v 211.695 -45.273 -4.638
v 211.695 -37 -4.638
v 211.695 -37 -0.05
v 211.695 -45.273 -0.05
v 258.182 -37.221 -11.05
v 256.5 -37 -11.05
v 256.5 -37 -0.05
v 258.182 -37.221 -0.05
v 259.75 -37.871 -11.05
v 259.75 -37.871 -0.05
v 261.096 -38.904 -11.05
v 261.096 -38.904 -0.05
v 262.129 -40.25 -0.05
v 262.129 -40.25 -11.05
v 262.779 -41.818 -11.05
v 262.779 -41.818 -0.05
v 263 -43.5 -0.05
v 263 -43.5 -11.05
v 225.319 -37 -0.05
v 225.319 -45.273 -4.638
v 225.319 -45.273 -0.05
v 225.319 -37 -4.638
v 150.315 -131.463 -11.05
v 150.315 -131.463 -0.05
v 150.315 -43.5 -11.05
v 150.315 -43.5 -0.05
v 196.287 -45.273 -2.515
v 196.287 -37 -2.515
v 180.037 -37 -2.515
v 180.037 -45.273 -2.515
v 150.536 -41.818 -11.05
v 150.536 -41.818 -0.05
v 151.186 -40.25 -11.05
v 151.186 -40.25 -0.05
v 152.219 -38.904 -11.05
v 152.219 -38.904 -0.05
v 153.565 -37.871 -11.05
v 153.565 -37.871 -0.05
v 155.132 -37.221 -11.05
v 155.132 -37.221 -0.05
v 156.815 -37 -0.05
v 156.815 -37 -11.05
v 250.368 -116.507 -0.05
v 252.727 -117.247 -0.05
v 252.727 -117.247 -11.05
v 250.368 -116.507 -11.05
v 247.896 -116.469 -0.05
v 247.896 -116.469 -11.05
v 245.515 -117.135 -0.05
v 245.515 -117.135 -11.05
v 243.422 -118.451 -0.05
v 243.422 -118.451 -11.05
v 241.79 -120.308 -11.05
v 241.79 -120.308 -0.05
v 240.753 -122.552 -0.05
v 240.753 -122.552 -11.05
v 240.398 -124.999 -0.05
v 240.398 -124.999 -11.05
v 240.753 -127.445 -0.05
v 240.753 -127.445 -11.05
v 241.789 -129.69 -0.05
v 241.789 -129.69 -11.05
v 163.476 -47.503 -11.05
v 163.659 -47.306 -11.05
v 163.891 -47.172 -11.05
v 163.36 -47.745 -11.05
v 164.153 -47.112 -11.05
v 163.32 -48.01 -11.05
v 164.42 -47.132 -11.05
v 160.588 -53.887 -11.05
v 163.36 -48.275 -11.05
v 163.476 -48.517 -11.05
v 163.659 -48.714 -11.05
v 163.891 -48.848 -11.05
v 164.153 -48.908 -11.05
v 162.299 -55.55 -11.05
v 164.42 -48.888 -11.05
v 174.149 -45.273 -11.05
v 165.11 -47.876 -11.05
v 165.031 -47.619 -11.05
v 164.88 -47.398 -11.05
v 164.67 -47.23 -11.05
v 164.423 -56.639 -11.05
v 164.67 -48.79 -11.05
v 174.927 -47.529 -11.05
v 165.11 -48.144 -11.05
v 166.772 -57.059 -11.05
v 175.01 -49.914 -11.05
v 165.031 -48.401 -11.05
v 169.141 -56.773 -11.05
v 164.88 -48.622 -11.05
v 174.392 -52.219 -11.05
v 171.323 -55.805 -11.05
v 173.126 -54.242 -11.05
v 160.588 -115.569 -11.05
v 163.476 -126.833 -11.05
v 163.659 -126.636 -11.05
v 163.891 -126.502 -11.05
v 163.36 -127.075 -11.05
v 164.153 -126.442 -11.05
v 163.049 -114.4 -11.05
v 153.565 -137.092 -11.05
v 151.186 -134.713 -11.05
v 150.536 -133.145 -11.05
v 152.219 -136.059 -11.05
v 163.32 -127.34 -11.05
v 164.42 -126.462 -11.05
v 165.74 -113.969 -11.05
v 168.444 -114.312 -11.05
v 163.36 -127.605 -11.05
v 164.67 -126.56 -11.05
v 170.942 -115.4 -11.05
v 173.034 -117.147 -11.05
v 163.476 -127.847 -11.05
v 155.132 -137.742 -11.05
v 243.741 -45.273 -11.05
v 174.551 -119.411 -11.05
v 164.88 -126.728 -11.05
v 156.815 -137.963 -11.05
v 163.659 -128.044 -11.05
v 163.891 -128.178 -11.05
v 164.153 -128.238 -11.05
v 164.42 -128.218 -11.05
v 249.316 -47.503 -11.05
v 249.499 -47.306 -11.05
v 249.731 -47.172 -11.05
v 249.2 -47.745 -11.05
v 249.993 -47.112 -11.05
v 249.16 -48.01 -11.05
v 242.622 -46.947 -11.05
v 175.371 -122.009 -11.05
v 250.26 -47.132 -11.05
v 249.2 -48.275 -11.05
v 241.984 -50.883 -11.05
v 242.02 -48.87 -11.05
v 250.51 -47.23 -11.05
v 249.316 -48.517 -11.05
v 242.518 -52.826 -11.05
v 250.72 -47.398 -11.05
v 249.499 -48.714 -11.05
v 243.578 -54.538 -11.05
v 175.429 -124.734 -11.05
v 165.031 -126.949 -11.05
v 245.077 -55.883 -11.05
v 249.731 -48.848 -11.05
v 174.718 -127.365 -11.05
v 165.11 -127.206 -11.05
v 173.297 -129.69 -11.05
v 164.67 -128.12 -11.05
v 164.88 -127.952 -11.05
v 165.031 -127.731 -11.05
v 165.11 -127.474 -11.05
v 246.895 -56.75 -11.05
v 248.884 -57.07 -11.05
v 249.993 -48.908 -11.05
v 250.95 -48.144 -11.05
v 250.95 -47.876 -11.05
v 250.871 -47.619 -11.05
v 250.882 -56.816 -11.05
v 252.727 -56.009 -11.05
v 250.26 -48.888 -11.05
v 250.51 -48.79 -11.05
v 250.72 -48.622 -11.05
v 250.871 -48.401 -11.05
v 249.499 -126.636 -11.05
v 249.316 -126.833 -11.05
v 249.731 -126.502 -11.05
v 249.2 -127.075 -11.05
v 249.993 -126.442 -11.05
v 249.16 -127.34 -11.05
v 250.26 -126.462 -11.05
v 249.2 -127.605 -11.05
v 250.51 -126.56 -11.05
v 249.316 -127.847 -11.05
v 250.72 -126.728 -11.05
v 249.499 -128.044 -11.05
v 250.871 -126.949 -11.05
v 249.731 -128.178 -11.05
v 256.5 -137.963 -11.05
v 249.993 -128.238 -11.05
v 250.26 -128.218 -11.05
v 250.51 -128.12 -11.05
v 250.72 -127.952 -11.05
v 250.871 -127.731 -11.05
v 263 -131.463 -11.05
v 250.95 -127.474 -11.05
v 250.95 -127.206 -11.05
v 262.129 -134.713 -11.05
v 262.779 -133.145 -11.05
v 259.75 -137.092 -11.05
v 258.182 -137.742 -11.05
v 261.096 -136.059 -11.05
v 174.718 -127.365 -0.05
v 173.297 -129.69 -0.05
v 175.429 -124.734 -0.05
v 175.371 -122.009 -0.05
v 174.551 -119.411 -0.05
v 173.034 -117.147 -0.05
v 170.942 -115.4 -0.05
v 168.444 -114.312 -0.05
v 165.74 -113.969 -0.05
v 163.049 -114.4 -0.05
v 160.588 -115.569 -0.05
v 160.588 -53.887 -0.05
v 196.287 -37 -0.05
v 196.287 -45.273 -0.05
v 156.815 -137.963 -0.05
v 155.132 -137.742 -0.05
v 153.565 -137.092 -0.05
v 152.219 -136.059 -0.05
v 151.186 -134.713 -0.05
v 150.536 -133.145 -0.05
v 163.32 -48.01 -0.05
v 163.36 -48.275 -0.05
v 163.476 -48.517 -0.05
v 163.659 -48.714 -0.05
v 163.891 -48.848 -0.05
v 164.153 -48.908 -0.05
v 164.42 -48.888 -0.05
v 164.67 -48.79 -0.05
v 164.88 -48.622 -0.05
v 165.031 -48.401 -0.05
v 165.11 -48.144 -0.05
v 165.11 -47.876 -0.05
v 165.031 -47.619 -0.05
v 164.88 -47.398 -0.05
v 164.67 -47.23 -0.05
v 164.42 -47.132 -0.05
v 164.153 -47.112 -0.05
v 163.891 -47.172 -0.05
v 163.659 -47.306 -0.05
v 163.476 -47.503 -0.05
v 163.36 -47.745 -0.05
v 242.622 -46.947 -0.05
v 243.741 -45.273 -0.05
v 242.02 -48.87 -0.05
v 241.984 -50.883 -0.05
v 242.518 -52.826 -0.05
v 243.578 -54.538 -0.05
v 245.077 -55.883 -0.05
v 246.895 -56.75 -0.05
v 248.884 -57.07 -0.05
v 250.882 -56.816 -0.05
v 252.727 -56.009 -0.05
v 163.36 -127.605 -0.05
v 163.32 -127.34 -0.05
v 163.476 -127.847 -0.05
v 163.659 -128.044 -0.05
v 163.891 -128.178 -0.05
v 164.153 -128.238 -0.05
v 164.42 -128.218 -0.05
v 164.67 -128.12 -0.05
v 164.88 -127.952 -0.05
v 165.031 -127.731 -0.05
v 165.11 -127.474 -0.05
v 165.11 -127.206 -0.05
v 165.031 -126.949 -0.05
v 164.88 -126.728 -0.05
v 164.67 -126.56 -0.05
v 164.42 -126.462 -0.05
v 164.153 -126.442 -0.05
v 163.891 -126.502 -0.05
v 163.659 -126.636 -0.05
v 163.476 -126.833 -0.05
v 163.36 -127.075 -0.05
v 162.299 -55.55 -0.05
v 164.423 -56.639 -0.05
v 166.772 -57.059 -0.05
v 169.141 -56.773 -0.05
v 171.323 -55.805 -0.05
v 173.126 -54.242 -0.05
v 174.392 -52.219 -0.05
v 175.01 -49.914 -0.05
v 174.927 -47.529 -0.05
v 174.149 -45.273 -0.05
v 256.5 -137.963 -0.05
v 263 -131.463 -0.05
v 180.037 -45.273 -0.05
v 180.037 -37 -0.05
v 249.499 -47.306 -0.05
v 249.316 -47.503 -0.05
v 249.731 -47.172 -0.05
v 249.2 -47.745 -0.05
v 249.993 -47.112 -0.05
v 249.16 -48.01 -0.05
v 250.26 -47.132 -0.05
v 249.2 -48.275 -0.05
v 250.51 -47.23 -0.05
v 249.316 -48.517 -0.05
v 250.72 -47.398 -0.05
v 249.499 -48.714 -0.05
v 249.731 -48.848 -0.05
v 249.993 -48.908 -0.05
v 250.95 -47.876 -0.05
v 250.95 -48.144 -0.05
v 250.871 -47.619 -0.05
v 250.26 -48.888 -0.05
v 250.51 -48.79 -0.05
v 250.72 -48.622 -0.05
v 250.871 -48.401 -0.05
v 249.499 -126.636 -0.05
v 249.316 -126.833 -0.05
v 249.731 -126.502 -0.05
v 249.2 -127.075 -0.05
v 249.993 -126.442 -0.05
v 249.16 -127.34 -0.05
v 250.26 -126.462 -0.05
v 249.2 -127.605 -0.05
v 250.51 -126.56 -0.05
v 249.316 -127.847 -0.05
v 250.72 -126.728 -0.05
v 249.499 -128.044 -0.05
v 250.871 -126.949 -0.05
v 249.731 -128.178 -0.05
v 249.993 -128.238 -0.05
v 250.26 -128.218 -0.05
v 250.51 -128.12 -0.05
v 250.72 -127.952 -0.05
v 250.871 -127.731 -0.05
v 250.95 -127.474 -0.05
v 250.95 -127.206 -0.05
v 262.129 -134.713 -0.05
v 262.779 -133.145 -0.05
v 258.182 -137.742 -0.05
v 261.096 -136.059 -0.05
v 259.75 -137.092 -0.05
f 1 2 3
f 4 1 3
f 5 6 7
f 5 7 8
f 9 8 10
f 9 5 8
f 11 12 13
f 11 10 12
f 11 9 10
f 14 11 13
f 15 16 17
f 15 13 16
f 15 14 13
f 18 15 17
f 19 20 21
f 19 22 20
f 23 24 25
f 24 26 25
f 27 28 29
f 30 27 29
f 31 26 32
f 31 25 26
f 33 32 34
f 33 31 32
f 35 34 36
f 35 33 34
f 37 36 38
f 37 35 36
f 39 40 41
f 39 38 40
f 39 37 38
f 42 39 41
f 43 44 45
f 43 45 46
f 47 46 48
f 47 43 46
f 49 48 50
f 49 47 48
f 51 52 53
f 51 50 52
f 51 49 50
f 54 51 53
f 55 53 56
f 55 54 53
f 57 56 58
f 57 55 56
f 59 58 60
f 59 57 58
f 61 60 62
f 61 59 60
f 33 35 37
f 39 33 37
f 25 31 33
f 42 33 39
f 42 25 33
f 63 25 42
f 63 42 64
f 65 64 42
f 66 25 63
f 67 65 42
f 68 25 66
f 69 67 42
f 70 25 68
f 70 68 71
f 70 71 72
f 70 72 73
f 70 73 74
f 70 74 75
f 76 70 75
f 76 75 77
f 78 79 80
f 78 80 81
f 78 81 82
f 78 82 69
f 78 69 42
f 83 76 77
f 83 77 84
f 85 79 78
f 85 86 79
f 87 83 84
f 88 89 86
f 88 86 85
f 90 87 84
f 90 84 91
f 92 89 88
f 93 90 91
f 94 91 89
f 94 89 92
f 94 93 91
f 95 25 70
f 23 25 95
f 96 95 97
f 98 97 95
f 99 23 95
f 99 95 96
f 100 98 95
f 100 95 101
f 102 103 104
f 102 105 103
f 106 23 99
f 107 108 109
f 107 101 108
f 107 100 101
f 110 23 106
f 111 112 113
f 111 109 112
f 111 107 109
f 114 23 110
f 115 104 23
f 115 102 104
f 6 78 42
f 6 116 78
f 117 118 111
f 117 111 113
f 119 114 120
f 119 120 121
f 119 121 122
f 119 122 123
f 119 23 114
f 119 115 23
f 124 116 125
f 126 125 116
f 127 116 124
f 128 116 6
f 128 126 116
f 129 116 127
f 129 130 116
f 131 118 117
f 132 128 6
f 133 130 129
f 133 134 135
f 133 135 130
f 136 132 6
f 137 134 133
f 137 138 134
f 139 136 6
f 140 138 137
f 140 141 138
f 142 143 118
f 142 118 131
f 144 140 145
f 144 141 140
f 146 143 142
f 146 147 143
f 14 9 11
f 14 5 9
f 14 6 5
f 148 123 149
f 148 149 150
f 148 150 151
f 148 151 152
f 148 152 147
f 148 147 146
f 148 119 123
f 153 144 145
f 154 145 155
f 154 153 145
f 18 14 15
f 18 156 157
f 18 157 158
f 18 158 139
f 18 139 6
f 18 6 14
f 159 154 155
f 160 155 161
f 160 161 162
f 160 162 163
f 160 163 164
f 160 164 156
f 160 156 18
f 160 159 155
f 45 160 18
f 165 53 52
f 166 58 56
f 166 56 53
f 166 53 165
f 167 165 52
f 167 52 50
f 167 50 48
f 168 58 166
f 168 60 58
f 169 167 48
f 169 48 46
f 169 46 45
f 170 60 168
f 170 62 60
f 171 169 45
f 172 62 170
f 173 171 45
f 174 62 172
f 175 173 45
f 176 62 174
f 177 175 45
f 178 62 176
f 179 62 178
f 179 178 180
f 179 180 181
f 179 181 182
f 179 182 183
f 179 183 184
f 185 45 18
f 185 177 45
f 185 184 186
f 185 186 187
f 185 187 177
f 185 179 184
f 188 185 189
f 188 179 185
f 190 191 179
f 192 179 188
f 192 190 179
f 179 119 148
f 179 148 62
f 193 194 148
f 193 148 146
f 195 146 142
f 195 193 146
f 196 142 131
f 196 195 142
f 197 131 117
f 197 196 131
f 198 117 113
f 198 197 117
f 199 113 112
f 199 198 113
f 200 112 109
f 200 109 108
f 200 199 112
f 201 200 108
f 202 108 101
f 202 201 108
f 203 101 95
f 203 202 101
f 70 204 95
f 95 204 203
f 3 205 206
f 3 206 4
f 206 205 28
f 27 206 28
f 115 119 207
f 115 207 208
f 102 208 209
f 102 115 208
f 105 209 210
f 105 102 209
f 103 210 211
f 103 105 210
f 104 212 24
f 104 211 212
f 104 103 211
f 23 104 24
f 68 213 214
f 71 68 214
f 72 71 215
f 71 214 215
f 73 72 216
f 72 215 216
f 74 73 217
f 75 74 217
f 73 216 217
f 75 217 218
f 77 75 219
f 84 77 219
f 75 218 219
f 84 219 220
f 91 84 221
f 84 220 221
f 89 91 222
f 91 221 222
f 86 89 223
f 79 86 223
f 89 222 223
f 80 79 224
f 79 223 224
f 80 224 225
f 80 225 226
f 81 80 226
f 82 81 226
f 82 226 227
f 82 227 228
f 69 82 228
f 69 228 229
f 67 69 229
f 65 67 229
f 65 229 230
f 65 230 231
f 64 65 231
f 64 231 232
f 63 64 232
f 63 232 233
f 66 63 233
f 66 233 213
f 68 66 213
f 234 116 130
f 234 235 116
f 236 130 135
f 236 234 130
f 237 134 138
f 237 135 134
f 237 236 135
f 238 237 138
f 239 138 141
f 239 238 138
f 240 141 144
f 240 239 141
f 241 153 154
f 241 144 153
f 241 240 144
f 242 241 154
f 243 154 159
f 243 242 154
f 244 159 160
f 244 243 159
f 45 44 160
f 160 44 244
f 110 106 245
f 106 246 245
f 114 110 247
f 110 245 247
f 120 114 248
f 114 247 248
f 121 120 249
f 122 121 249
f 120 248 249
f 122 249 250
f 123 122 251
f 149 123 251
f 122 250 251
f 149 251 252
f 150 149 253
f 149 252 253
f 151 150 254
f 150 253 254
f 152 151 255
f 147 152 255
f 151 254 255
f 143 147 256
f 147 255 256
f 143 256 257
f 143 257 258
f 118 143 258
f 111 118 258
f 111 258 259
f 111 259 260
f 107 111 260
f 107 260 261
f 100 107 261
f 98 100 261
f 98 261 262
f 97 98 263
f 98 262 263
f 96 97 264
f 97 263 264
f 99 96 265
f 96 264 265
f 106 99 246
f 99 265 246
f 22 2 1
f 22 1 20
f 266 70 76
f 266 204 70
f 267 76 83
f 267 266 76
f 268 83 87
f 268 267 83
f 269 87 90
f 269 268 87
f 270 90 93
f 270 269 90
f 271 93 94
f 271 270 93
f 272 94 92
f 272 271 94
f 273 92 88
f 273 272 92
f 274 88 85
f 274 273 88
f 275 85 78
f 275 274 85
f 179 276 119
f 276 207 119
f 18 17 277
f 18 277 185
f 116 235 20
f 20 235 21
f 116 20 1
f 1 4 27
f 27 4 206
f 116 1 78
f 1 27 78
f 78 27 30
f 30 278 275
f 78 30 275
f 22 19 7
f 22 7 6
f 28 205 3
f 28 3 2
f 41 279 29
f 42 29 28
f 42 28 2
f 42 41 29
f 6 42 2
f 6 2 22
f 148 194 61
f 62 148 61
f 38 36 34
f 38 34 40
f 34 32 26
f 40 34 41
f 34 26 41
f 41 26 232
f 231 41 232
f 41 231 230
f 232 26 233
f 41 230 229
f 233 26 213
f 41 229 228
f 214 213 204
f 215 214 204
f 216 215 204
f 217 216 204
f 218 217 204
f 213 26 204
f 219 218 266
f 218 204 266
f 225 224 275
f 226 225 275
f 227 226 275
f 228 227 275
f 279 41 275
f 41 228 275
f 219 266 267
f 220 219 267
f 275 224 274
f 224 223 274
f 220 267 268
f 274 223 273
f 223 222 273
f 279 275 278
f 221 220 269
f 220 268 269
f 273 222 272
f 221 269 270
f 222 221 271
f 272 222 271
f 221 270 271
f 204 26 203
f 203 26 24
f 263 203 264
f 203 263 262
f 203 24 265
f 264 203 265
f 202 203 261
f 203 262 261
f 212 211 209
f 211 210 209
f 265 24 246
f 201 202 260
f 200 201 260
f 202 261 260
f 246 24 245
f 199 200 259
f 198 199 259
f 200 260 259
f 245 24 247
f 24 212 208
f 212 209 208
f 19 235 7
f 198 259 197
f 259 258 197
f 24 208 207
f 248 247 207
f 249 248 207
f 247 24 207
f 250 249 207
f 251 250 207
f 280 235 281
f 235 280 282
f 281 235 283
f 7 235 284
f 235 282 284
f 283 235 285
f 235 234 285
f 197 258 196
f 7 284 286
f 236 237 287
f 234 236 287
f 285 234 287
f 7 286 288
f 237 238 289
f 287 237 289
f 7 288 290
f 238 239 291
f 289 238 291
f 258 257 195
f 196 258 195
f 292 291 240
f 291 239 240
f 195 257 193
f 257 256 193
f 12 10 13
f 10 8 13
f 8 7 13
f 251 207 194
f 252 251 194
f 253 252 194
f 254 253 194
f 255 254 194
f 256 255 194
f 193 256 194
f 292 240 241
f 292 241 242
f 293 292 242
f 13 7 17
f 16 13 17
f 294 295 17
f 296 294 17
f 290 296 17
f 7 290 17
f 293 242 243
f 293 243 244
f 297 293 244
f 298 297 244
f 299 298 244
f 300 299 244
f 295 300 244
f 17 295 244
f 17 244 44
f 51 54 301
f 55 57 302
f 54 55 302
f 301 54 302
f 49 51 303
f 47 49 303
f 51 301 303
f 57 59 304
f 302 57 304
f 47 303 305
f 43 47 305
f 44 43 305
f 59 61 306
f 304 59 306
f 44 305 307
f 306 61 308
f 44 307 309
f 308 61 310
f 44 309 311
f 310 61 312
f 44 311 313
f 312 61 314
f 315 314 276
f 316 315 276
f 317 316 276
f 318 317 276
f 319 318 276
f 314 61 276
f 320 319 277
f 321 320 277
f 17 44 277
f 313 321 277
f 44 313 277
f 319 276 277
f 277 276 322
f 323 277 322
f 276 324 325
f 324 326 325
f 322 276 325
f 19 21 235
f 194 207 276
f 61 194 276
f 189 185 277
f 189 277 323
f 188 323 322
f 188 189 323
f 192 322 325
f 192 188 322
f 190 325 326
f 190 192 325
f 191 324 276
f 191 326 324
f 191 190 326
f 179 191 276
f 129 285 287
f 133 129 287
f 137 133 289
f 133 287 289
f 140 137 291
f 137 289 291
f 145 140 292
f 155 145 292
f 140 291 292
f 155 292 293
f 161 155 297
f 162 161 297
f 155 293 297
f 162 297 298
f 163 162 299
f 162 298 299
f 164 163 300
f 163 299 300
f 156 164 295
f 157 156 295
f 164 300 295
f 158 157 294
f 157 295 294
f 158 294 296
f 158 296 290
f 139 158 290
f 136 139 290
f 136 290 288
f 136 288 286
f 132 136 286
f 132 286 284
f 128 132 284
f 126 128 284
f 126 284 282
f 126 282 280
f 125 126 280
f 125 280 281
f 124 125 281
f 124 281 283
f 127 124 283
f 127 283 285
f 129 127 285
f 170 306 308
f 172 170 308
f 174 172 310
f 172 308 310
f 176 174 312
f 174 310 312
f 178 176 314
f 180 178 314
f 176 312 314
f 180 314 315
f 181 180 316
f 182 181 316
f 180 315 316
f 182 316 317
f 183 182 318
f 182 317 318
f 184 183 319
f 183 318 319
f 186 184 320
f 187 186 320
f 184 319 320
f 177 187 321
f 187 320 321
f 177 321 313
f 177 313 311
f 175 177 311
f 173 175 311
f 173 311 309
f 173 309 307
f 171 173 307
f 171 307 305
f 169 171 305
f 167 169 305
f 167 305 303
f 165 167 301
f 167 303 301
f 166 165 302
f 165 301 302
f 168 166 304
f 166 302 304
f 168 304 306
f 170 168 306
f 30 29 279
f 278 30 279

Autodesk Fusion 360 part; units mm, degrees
sketch "Sketch2" plane through (0, 0, -0.05) normal (0, 0, -1) x (1, 0, 0)
  line L0 (260, 40) -> (153.3147, 40)
  line L1 (153.3147, 40) -> (153.3147, 134.963)
  line L2 (153.3147, 134.963) -> (260, 134.963)
  line L3 (260, 134.963) -> (260, 40)
  line L4 (254.727, 129.69) -> (254.727, 45.273)
  line L5 (254.727, 45.273) -> (158.5878, 45.273)
  line L6 (158.5878, 45.273) -> (158.5878, 129.69)
  line L7 (158.5878, 129.69) -> (254.727, 129.69)
  dimension "d1" = 5.273
extrude "Extrude1" add sketch "Sketch2" along normal blind 11
extrude "Extrude2" add 1 faces at (153.3147, -71.6543, -3.7167) along direction (-1, 0, 0) blind 3
extrude "Extrude3" add 1 faces at (223.4382, -40, -3.7167) along direction (0, 1, 0) blind 3
extrude "Extrude4" add 1 faces at (260, -102.3087, -3.7167) along direction (1, 0, 0) blind 3
extrude "Extrude5" add 1 faces at (225.4382, -134.963, -7.3833) along direction (0, -1, 0) blind 3
sketch "Sketch3" plane through (0, -37, 0) normal (0, 1, 0) x (-1, 0, 0)
  line L0 (-150.3147, -0.05) -> (-263, -0.05)
  line L1 (-263, -0.05) -> (-263, -11.05)
  line L2 (-263, -11.05) -> (-150.3147, -11.05)
  line L3 (-150.3147, -11.05) -> (-150.3147, -0.05)
  line L4 (-180.0368, -0.05) -> (-196.2868, -0.05)
  line L5 (-196.2868, -0.05) -> (-196.2868, -2.5147)
  line L6 (-196.2868, -2.5147) -> (-180.0368, -2.5147)
  line L7 (-180.0368, -2.5147) -> (-180.0368, -0.05)
extrude "Extrude6" cut sketch "Sketch3" against normal blind 23 contours L0 L4 L5 L6 L7
sketch "Sketch4" plane through (0, -37, 0) normal (0, 1, 0) x (-1, 0, 0)
  line L0 (-196.2868, -2.5147) -> (-196.2868, -0.05)
  line L1 (-196.2868, -0.05) -> (-263, -0.05)
  line L2 (-263, -0.05) -> (-263, -11.05)
  line L3 (-263, -11.05) -> (-150.3147, -11.05)
  line L4 (-150.3147, -11.05) -> (-150.3147, -0.05)
  line L5 (-150.3147, -0.05) -> (-180.0368, -0.05)
  line L6 (-180.0368, -0.05) -> (-180.0368, -2.5147)
  line L7 (-180.0368, -2.5147) -> (-196.2868, -2.5147)
  line L8 (-223.6278, -0.05) -> (-213.3861, -0.05)
  line L9 (-213.3861, -0.05) -> (-213.3861, -4.6383)
  line L10 (-213.3861, -4.6383) -> (-223.6278, -4.6383)
  line L11 (-223.6278, -4.6383) -> (-223.6278, -0.05)
extrude "Extrude7" cut sketch "Sketch4" against normal blind 15.5 contours L1 L8 L9 L10 L11
extrude "Extrude8" add 1 faces at (158.5878, -73.412, -3.7167) along direction (1, 0, 0) blind 2
extrude "Extrude9" add 1 faces at (254.727, -101.551, -3.7167) along direction (-1, 0, 0) blind 2
sketch "Sketch5" plane through (0, 0, -0.05) normal (0, 0, -1) x (1, 0, 0)
  circle A0 centre (167, 49) radius 8.0623
extrude "Extrude10" add sketch "Sketch5" along normal blind 11
sketch "Sketch6" plane through (0, 0, -0.05) normal (0, 0, -1) x (1, 0, 0)
  circle A0 centre (166, 126) radius 7.8102
  circle A1 centre (247, 125) radius 9.2195
  circle A2 centre (249, 50) radius 7.0711
extrude "Extrude11" add sketch "Sketch6" along normal blind 11 contours A2
sketch "Sketch7" plane through (0, 0, -0.05) normal (0, 0, -1) x (1, 0, 0)
  circle A0 centre (249, 125) radius 8.6023
extrude "Extrude12" add sketch "Sketch7" along normal blind 11
sketch "Sketch8" plane through (0, 0, -0.05) normal (0, 0, -1) x (1, 0, 0)
  circle A0 centre (165.8963, 123.5709) radius 9.6029
extrude "Extrude13" add sketch "Sketch8" along normal blind 11
fillet "Fillet1" radius 6.5 1 edges at (263, -137.963, -5.55)
fillet "Fillet2" radius 6.5 1 edges at (263, -37, -5.55)
fillet "Fillet3" radius 6.5 1 edges at (150.3147, -37, -5.55)
fillet "Fillet4" radius 6.5 1 edges at (150.3147, -137.963, -5.55)
sketch "Sketch9" plane through (0, 0, 0) normal (0, 0, 1) x (-1, 0, 0)
  circle A0 centre (-164.22, 127.34) radius 2.2
  circle A1 centre (-165.3867, 128.5067) radius 0.175
  circle A2 centre (-164.22, 128.99) radius 0.175
  circle A3 centre (-165.87, 127.34) radius 0.175
  circle A4 centre (-164.22, 127.34) radius 1.075
  circle A5 centre (-163.0533, 128.5067) radius 0.175
  circle A6 centre (-162.57, 127.34) radius 0.175
  circle A7 centre (-165.3867, 126.1733) radius 0.175
  circle A8 centre (-164.22, 125.69) radius 0.175
  circle A9 centre (-163.0533, 126.1733) radius 0.175
sketch "Sketch10" plane through (0, 0, 1.56) normal (0, 0, 1) x (-1, 0, 0)
  arc A0 (-164.0236, 44.0124) -> (-160.2224, 47.8136) centre (-164.22, 48.01) ccw
  line L0 (-160.2224, 47.8136) -> (-160.22, 48.01)
  line L1 (-160.22, 48.01) -> (-160.22, 127.34)
  line L2 (-160.22, 127.34) -> (-160.2224, 127.5364)
  arc A1 (-160.2224, 127.5364) -> (-164.0236, 131.3376) centre (-164.22, 127.34) ccw
  line L3 (-164.0236, 131.3376) -> (-164.22, 131.34)
  line L4 (-164.22, 131.34) -> (-250.06, 131.34)
  line L5 (-250.06, 131.34) -> (-250.2564, 131.3376)
  arc A2 (-250.2564, 131.3376) -> (-254.0576, 127.5364) centre (-250.06, 127.34) ccw
  line L6 (-254.0576, 127.5364) -> (-254.06, 127.34)
  line L7 (-254.06, 127.34) -> (-254.06, 48.01)
  line L8 (-254.06, 48.01) -> (-254.0576, 47.8136)
  arc A3 (-254.0576, 47.8136) -> (-250.2564, 44.0124) centre (-250.06, 48.01) ccw
  line L9 (-250.2564, 44.0124) -> (-250.06, 44.01)
  line L10 (-250.06, 44.01) -> (-164.22, 44.01)
  line L11 (-164.22, 44.01) -> (-164.0236, 44.0124)
  circle A4 centre (-164.22, 127.34) radius 2.2
  circle A5 centre (-250.06, 127.34) radius 2.2
  circle A6 centre (-188.38, 126.32) radius 1.1
  circle A7 centre (-198.58, 126.32) radius 1.1
  arc A8 (-214.77, 126.55) -> (-214.77, 124.65) centre (-214.77, 125.6) ccw
  line L12 (-214.77, 126.55) -> (-213.47, 126.55)
  arc A9 (-213.47, 124.65) -> (-213.47, 126.55) centre (-213.47, 125.6) ccw
  line L13 (-213.47, 124.65) -> (-214.77, 124.65)
  arc A10 (-227.27, 126.55) -> (-227.27, 124.65) centre (-227.27, 125.6) ccw
  line L14 (-227.27, 126.55) -> (-225.97, 126.55)
  arc A11 (-225.97, 124.65) -> (-225.97, 126.55) centre (-225.97, 125.6) ccw
  line L15 (-225.97, 124.65) -> (-227.27, 124.65)
  circle A12 centre (-188.38, 123.57) radius 0.9
  circle A13 centre (-198.58, 123.57) radius 0.9
  arc A14 (-214.77, 121.55) -> (-214.77, 119.65) centre (-214.77, 120.6) ccw
  line L16 (-214.77, 121.55) -> (-213.47, 121.55)
  arc A15 (-213.47, 119.65) -> (-213.47, 121.55) centre (-213.47, 120.6) ccw
  line L17 (-213.47, 119.65) -> (-214.77, 119.65)
  arc A16 (-227.27, 121.55) -> (-227.27, 119.65) centre (-227.27, 120.6) ccw
  line L18 (-227.27, 121.55) -> (-225.97, 121.55)
  arc A17 (-225.97, 119.65) -> (-225.97, 121.55) centre (-225.97, 120.6) ccw
  line L19 (-225.97, 119.65) -> (-227.27, 119.65)
  circle A18 centre (-188.38, 119.92) radius 1.1
  circle A19 centre (-198.58, 119.92) radius 1.1
  circle A20 centre (-248.26, 102) radius 0.85
  circle A21 centre (-248.26, 99.46) radius 0.85
  circle A22 centre (-248.26, 96.92) radius 0.85
  circle A23 centre (-248.26, 94.38) radius 0.85
  circle A24 centre (-248.26, 91.84) radius 0.85
  circle A25 centre (-248.26, 89.3) radius 0.85
  circle A26 centre (-248.26, 86.76) radius 0.85
  circle A27 centre (-248.26, 84.22) radius 0.85
  circle A28 centre (-248.26, 81.68) radius 0.85
  circle A29 centre (-248.26, 79.14) radius 0.85
  circle A30 centre (-248.26, 76.6) radius 0.85
  circle A31 centre (-248.26, 74.06) radius 0.85
  circle A32 centre (-248.26, 71.52) radius 0.85
  line L20 (-249.11, 68.13) -> (-249.11, 69.83)
  line L21 (-249.11, 69.83) -> (-247.41, 69.83)
  line L22 (-247.41, 69.83) -> (-247.41, 68.13)
  line L23 (-247.41, 68.13) -> (-249.11, 68.13)
  circle A33 centre (-202.95, 54.5201) radius 0.6604
  circle A34 centre (-205.49, 54.5201) radius 0.6604
  circle A35 centre (-208.03, 54.5201) radius 0.6604
  arc A36 (-215.57, 49.8) -> (-216.67, 49.8) centre (-216.12, 49.8) ccw
  line L24 (-215.57, 49.8) -> (-215.57, 49.4)
  arc A37 (-216.67, 49.4) -> (-215.57, 49.4) centre (-216.12, 49.4) ccw
  line L25 (-216.67, 49.4) -> (-216.67, 49.8)
  arc A38 (-220.41, 49.8) -> (-221.51, 49.8) centre (-220.96, 49.8) ccw
  line L26 (-220.41, 49.8) -> (-220.41, 49.4)
  arc A39 (-221.51, 49.4) -> (-220.41, 49.4) centre (-220.96, 49.4) ccw
  line L27 (-221.51, 49.4) -> (-221.51, 49.8)
  circle A40 centre (-164.22, 48.01) radius 2.2
  circle A41 centre (-250.06, 48.01) radius 2.2
  arc A42 (-215.1383, 46.8412) -> (-216.485, 46.775) centre (-215.81, 46.775) ccw
  line L28 (-215.1383, 46.8412) -> (-215.135, 46.425)
  arc A43 (-216.4817, 46.3588) -> (-215.135, 46.425) centre (-215.81, 46.425) ccw
  line L29 (-216.4817, 46.3588) -> (-216.485, 46.775)
  arc A44 (-220.5983, 46.8412) -> (-221.945, 46.775) centre (-221.27, 46.775) ccw
  line L30 (-220.5983, 46.8412) -> (-220.595, 46.425)
  arc A45 (-221.9417, 46.3588) -> (-220.595, 46.425) centre (-221.27, 46.425) ccw
  line L31 (-221.9417, 46.3588) -> (-221.945, 46.775)
  circle A46 centre (-164.22, 48.01) radius 0.9003
extrude "Extrude14" cut sketch "Sketch10" against normal blind 13 contours A46
sketch "Sketch11" plane through (0, 0, 1.56) normal (0, 0, 1) x (-1, 0, 0)
  arc A0 (-164.0236, 44.0124) -> (-160.2224, 47.8136) centre (-164.22, 48.01) ccw
  line L0 (-160.2224, 47.8136) -> (-160.22, 48.01)
  line L1 (-160.22, 48.01) -> (-160.22, 127.34)
  line L2 (-160.22, 127.34) -> (-160.2224, 127.5364)
  arc A1 (-160.2224, 127.5364) -> (-164.0236, 131.3376) centre (-164.22, 127.34) ccw
  line L3 (-164.0236, 131.3376) -> (-164.22, 131.34)
  line L4 (-164.22, 131.34) -> (-250.06, 131.34)
  line L5 (-250.06, 131.34) -> (-250.2564, 131.3376)
  arc A2 (-250.2564, 131.3376) -> (-254.0576, 127.5364) centre (-250.06, 127.34) ccw
  line L6 (-254.0576, 127.5364) -> (-254.06, 127.34)
  line L7 (-254.06, 127.34) -> (-254.06, 48.01)
  line L8 (-254.06, 48.01) -> (-254.0576, 47.8136)
  arc A3 (-254.0576, 47.8136) -> (-250.2564, 44.0124) centre (-250.06, 48.01) ccw
  line L9 (-250.2564, 44.0124) -> (-250.06, 44.01)
  line L10 (-250.06, 44.01) -> (-164.22, 44.01)
  line L11 (-164.22, 44.01) -> (-164.0236, 44.0124)
  circle A4 centre (-164.22, 127.34) radius 2.2
  circle A5 centre (-250.06, 127.34) radius 2.2
  circle A6 centre (-188.38, 126.32) radius 1.1
  circle A7 centre (-198.58, 126.32) radius 1.1
  arc A8 (-214.77, 126.55) -> (-214.77, 124.65) centre (-214.77, 125.6) ccw
  line L12 (-214.77, 126.55) -> (-213.47, 126.55)
  arc A9 (-213.47, 124.65) -> (-213.47, 126.55) centre (-213.47, 125.6) ccw
  line L13 (-213.47, 124.65) -> (-214.77, 124.65)
  arc A10 (-227.27, 126.55) -> (-227.27, 124.65) centre (-227.27, 125.6) ccw
  line L14 (-227.27, 126.55) -> (-225.97, 126.55)
  arc A11 (-225.97, 124.65) -> (-225.97, 126.55) centre (-225.97, 125.6) ccw
  line L15 (-225.97, 124.65) -> (-227.27, 124.65)
  circle A12 centre (-188.38, 123.57) radius 0.9
  circle A13 centre (-198.58, 123.57) radius 0.9
  arc A14 (-214.77, 121.55) -> (-214.77, 119.65) centre (-214.77, 120.6) ccw
  line L16 (-214.77, 121.55) -> (-213.47, 121.55)
  arc A15 (-213.47, 119.65) -> (-213.47, 121.55) centre (-213.47, 120.6) ccw
  line L17 (-213.47, 119.65) -> (-214.77, 119.65)
  arc A16 (-227.27, 121.55) -> (-227.27, 119.65) centre (-227.27, 120.6) ccw
  line L18 (-227.27, 121.55) -> (-225.97, 121.55)
  arc A17 (-225.97, 119.65) -> (-225.97, 121.55) centre (-225.97, 120.6) ccw
  line L19 (-225.97, 119.65) -> (-227.27, 119.65)
  circle A18 centre (-188.38, 119.92) radius 1.1
  circle A19 centre (-198.58, 119.92) radius 1.1
  circle A20 centre (-248.26, 102) radius 0.85
  circle A21 centre (-248.26, 99.46) radius 0.85
  circle A22 centre (-248.26, 96.92) radius 0.85
  circle A23 centre (-248.26, 94.38) radius 0.85
  circle A24 centre (-248.26, 91.84) radius 0.85
  circle A25 centre (-248.26, 89.3) radius 0.85
  circle A26 centre (-248.26, 86.76) radius 0.85
  circle A27 centre (-248.26, 84.22) radius 0.85
  circle A28 centre (-248.26, 81.68) radius 0.85
  circle A29 centre (-248.26, 79.14) radius 0.85
  circle A30 centre (-248.26, 76.6) radius 0.85
  circle A31 centre (-248.26, 74.06) radius 0.85
  circle A32 centre (-248.26, 71.52) radius 0.85
  line L20 (-249.11, 68.13) -> (-249.11, 69.83)
  line L21 (-249.11, 69.83) -> (-247.41, 69.83)
  line L22 (-247.41, 69.83) -> (-247.41, 68.13)
  line L23 (-247.41, 68.13) -> (-249.11, 68.13)
  circle A33 centre (-202.95, 54.5201) radius 0.6604
  circle A34 centre (-205.49, 54.5201) radius 0.6604
  circle A35 centre (-208.03, 54.5201) radius 0.6604
  arc A36 (-215.57, 49.8) -> (-216.67, 49.8) centre (-216.12, 49.8) ccw
  line L24 (-215.57, 49.8) -> (-215.57, 49.4)
  arc A37 (-216.67, 49.4) -> (-215.57, 49.4) centre (-216.12, 49.4) ccw
  line L25 (-216.67, 49.4) -> (-216.67, 49.8)
  arc A38 (-220.41, 49.8) -> (-221.51, 49.8) centre (-220.96, 49.8) ccw
  line L26 (-220.41, 49.8) -> (-220.41, 49.4)
  arc A39 (-221.51, 49.4) -> (-220.41, 49.4) centre (-220.96, 49.4) ccw
  line L27 (-221.51, 49.4) -> (-221.51, 49.8)
  circle A40 centre (-164.22, 48.01) radius 2.2
  circle A41 centre (-250.06, 48.01) radius 2.2
  arc A42 (-215.1383, 46.8412) -> (-216.485, 46.775) centre (-215.81, 46.775) ccw
  line L28 (-215.1383, 46.8412) -> (-215.135, 46.425)
  arc A43 (-216.4817, 46.3588) -> (-215.135, 46.425) centre (-215.81, 46.425) ccw
  line L29 (-216.4817, 46.3588) -> (-216.485, 46.775)
  arc A44 (-220.5983, 46.8412) -> (-221.945, 46.775) centre (-221.27, 46.775) ccw
  line L30 (-220.5983, 46.8412) -> (-220.595, 46.425)
  arc A45 (-221.9417, 46.3588) -> (-220.595, 46.425) centre (-221.27, 46.425) ccw
  line L31 (-221.9417, 46.3588) -> (-221.945, 46.775)
  circle A46 centre (-250.06, 48.01) radius 0.9005
  dimension "d38" = 1.801
extrude "Extrude15" cut sketch "Sketch11" against normal blind 14 contours A46
sketch "Sketch12" plane through (0, 0, 1.56) normal (0, 0, 1) x (-1, 0, 0)
  arc A0 (-164.0236, 44.0124) -> (-160.2224, 47.8136) centre (-164.22, 48.01) ccw
  line L0 (-160.2224, 47.8136) -> (-160.22, 48.01)
  line L1 (-160.22, 48.01) -> (-160.22, 127.34)
  line L2 (-160.22, 127.34) -> (-160.2224, 127.5364)
  arc A1 (-160.2224, 127.5364) -> (-164.0236, 131.3376) centre (-164.22, 127.34) ccw
  line L3 (-164.0236, 131.3376) -> (-164.22, 131.34)
  line L4 (-164.22, 131.34) -> (-250.06, 131.34)
  line L5 (-250.06, 131.34) -> (-250.2564, 131.3376)
  arc A2 (-250.2564, 131.3376) -> (-254.0576, 127.5364) centre (-250.06, 127.34) ccw
  line L6 (-254.0576, 127.5364) -> (-254.06, 127.34)
  line L7 (-254.06, 127.34) -> (-254.06, 48.01)
  line L8 (-254.06, 48.01) -> (-254.0576, 47.8136)
  arc A3 (-254.0576, 47.8136) -> (-250.2564, 44.0124) centre (-250.06, 48.01) ccw
  line L9 (-250.2564, 44.0124) -> (-250.06, 44.01)
  line L10 (-250.06, 44.01) -> (-164.22, 44.01)
  line L11 (-164.22, 44.01) -> (-164.0236, 44.0124)
  circle A4 centre (-164.22, 127.34) radius 2.2
  circle A5 centre (-250.06, 127.34) radius 2.2
  circle A6 centre (-188.38, 126.32) radius 1.1
  circle A7 centre (-198.58, 126.32) radius 1.1
  arc A8 (-214.77, 126.55) -> (-214.77, 124.65) centre (-214.77, 125.6) ccw
  line L12 (-214.77, 126.55) -> (-213.47, 126.55)
  arc A9 (-213.47, 124.65) -> (-213.47, 126.55) centre (-213.47, 125.6) ccw
  line L13 (-213.47, 124.65) -> (-214.77, 124.65)
  arc A10 (-227.27, 126.55) -> (-227.27, 124.65) centre (-227.27, 125.6) ccw
  line L14 (-227.27, 126.55) -> (-225.97, 126.55)
  arc A11 (-225.97, 124.65) -> (-225.97, 126.55) centre (-225.97, 125.6) ccw
  line L15 (-225.97, 124.65) -> (-227.27, 124.65)
  circle A12 centre (-188.38, 123.57) radius 0.9
  circle A13 centre (-198.58, 123.57) radius 0.9
  arc A14 (-214.77, 121.55) -> (-214.77, 119.65) centre (-214.77, 120.6) ccw
  line L16 (-214.77, 121.55) -> (-213.47, 121.55)
  arc A15 (-213.47, 119.65) -> (-213.47, 121.55) centre (-213.47, 120.6) ccw
  line L17 (-213.47, 119.65) -> (-214.77, 119.65)
  arc A16 (-227.27, 121.55) -> (-227.27, 119.65) centre (-227.27, 120.6) ccw
  line L18 (-227.27, 121.55) -> (-225.97, 121.55)
  arc A17 (-225.97, 119.65) -> (-225.97, 121.55) centre (-225.97, 120.6) ccw
  line L19 (-225.97, 119.65) -> (-227.27, 119.65)
  circle A18 centre (-188.38, 119.92) radius 1.1
  circle A19 centre (-198.58, 119.92) radius 1.1
  circle A20 centre (-248.26, 102) radius 0.85
  circle A21 centre (-248.26, 99.46) radius 0.85
  circle A22 centre (-248.26, 96.92) radius 0.85
  circle A23 centre (-248.26, 94.38) radius 0.85
  circle A24 centre (-248.26, 91.84) radius 0.85
  circle A25 centre (-248.26, 89.3) radius 0.85
  circle A26 centre (-248.26, 86.76) radius 0.85
  circle A27 centre (-248.26, 84.22) radius 0.85
  circle A28 centre (-248.26, 81.68) radius 0.85
  circle A29 centre (-248.26, 79.14) radius 0.85
  circle A30 centre (-248.26, 76.6) radius 0.85
  circle A31 centre (-248.26, 74.06) radius 0.85
  circle A32 centre (-248.26, 71.52) radius 0.85
  line L20 (-249.11, 68.13) -> (-249.11, 69.83)
  line L21 (-249.11, 69.83) -> (-247.41, 69.83)
  line L22 (-247.41, 69.83) -> (-247.41, 68.13)
  line L23 (-247.41, 68.13) -> (-249.11, 68.13)
  circle A33 centre (-202.95, 54.5201) radius 0.6604
  circle A34 centre (-205.49, 54.5201) radius 0.6604
  circle A35 centre (-208.03, 54.5201) radius 0.6604
  arc A36 (-215.57, 49.8) -> (-216.67, 49.8) centre (-216.12, 49.8) ccw
  line L24 (-215.57, 49.8) -> (-215.57, 49.4)
  arc A37 (-216.67, 49.4) -> (-215.57, 49.4) centre (-216.12, 49.4) ccw
  line L25 (-216.67, 49.4) -> (-216.67, 49.8)
  arc A38 (-220.41, 49.8) -> (-221.51, 49.8) centre (-220.96, 49.8) ccw
  line L26 (-220.41, 49.8) -> (-220.41, 49.4)
  arc A39 (-221.51, 49.4) -> (-220.41, 49.4) centre (-220.96, 49.4) ccw
  line L27 (-221.51, 49.4) -> (-221.51, 49.8)
  circle A40 centre (-164.22, 48.01) radius 2.2
  circle A41 centre (-250.06, 48.01) radius 2.2
  arc A42 (-215.1383, 46.8412) -> (-216.485, 46.775) centre (-215.81, 46.775) ccw
  line L28 (-215.1383, 46.8412) -> (-215.135, 46.425)
  arc A43 (-216.4817, 46.3588) -> (-215.135, 46.425) centre (-215.81, 46.425) ccw
  line L29 (-216.4817, 46.3588) -> (-216.485, 46.775)
  arc A44 (-220.5983, 46.8412) -> (-221.945, 46.775) centre (-221.27, 46.775) ccw
  line L30 (-220.5983, 46.8412) -> (-220.595, 46.425)
  arc A45 (-221.9417, 46.3588) -> (-220.595, 46.425) centre (-221.27, 46.425) ccw
  line L31 (-221.9417, 46.3588) -> (-221.945, 46.775)
  circle A46 centre (-250.06, 127.34) radius 0.9005
  dimension "d41" = 1.801
extrude "Extrude16" cut sketch "Sketch12" against normal blind 13 contours A46
sketch "Sketch13" plane through (0, 0, 1.56) normal (0, 0, 1) x (-1, 0, 0)
  arc A0 (-164.0236, 44.0124) -> (-160.2224, 47.8136) centre (-164.22, 48.01) ccw
  line L0 (-160.2224, 47.8136) -> (-160.22, 48.01)
  line L1 (-160.22, 48.01) -> (-160.22, 127.34)
  line L2 (-160.22, 127.34) -> (-160.2224, 127.5364)
  arc A1 (-160.2224, 127.5364) -> (-164.0236, 131.3376) centre (-164.22, 127.34) ccw
  line L3 (-164.0236, 131.3376) -> (-164.22, 131.34)
  line L4 (-164.22, 131.34) -> (-250.06, 131.34)
  line L5 (-250.06, 131.34) -> (-250.2564, 131.3376)
  arc A2 (-250.2564, 131.3376) -> (-254.0576, 127.5364) centre (-250.06, 127.34) ccw
  line L6 (-254.0576, 127.5364) -> (-254.06, 127.34)
  line L7 (-254.06, 127.34) -> (-254.06, 48.01)
  line L8 (-254.06, 48.01) -> (-254.0576, 47.8136)
  arc A3 (-254.0576, 47.8136) -> (-250.2564, 44.0124) centre (-250.06, 48.01) ccw
  line L9 (-250.2564, 44.0124) -> (-250.06, 44.01)
  line L10 (-250.06, 44.01) -> (-164.22, 44.01)
  line L11 (-164.22, 44.01) -> (-164.0236, 44.0124)
  circle A4 centre (-164.22, 127.34) radius 2.2
  circle A5 centre (-250.06, 127.34) radius 2.2
  circle A6 centre (-188.38, 126.32) radius 1.1
  circle A7 centre (-198.58, 126.32) radius 1.1
  arc A8 (-214.77, 126.55) -> (-214.77, 124.65) centre (-214.77, 125.6) ccw
  line L12 (-214.77, 126.55) -> (-213.47, 126.55)
  arc A9 (-213.47, 124.65) -> (-213.47, 126.55) centre (-213.47, 125.6) ccw
  line L13 (-213.47, 124.65) -> (-214.77, 124.65)
  arc A10 (-227.27, 126.55) -> (-227.27, 124.65) centre (-227.27, 125.6) ccw
  line L14 (-227.27, 126.55) -> (-225.97, 126.55)
  arc A11 (-225.97, 124.65) -> (-225.97, 126.55) centre (-225.97, 125.6) ccw
  line L15 (-225.97, 124.65) -> (-227.27, 124.65)
  circle A12 centre (-188.38, 123.57) radius 0.9
  circle A13 centre (-198.58, 123.57) radius 0.9
  arc A14 (-214.77, 121.55) -> (-214.77, 119.65) centre (-214.77, 120.6) ccw
  line L16 (-214.77, 121.55) -> (-213.47, 121.55)
  arc A15 (-213.47, 119.65) -> (-213.47, 121.55) centre (-213.47, 120.6) ccw
  line L17 (-213.47, 119.65) -> (-214.77, 119.65)
  arc A16 (-227.27, 121.55) -> (-227.27, 119.65) centre (-227.27, 120.6) ccw
  line L18 (-227.27, 121.55) -> (-225.97, 121.55)
  arc A17 (-225.97, 119.65) -> (-225.97, 121.55) centre (-225.97, 120.6) ccw
  line L19 (-225.97, 119.65) -> (-227.27, 119.65)
  circle A18 centre (-188.38, 119.92) radius 1.1
  circle A19 centre (-198.58, 119.92) radius 1.1
  circle A20 centre (-248.26, 102) radius 0.85
  circle A21 centre (-248.26, 99.46) radius 0.85
  circle A22 centre (-248.26, 96.92) radius 0.85
  circle A23 centre (-248.26, 94.38) radius 0.85
  circle A24 centre (-248.26, 91.84) radius 0.85
  circle A25 centre (-248.26, 89.3) radius 0.85
  circle A26 centre (-248.26, 86.76) radius 0.85
  circle A27 centre (-248.26, 84.22) radius 0.85
  circle A28 centre (-248.26, 81.68) radius 0.85
  circle A29 centre (-248.26, 79.14) radius 0.85
  circle A30 centre (-248.26, 76.6) radius 0.85
  circle A31 centre (-248.26, 74.06) radius 0.85
  circle A32 centre (-248.26, 71.52) radius 0.85
  line L20 (-249.11, 68.13) -> (-249.11, 69.83)
  line L21 (-249.11, 69.83) -> (-247.41, 69.83)
  line L22 (-247.41, 69.83) -> (-247.41, 68.13)
  line L23 (-247.41, 68.13) -> (-249.11, 68.13)
  circle A33 centre (-202.95, 54.5201) radius 0.6604
  circle A34 centre (-205.49, 54.5201) radius 0.6604
  circle A35 centre (-208.03, 54.5201) radius 0.6604
  arc A36 (-215.57, 49.8) -> (-216.67, 49.8) centre (-216.12, 49.8) ccw
  line L24 (-215.57, 49.8) -> (-215.57, 49.4)
  arc A37 (-216.67, 49.4) -> (-215.57, 49.4) centre (-216.12, 49.4) ccw
  line L25 (-216.67, 49.4) -> (-216.67, 49.8)
  arc A38 (-220.41, 49.8) -> (-221.51, 49.8) centre (-220.96, 49.8) ccw
  line L26 (-220.41, 49.8) -> (-220.41, 49.4)
  arc A39 (-221.51, 49.4) -> (-220.41, 49.4) centre (-220.96, 49.4) ccw
  line L27 (-221.51, 49.4) -> (-221.51, 49.8)
  circle A40 centre (-164.22, 48.01) radius 2.2
  circle A41 centre (-250.06, 48.01) radius 2.2
  arc A42 (-215.1383, 46.8412) -> (-216.485, 46.775) centre (-215.81, 46.775) ccw
  line L28 (-215.1383, 46.8412) -> (-215.135, 46.425)
  arc A43 (-216.4817, 46.3588) -> (-215.135, 46.425) centre (-215.81, 46.425) ccw
  line L29 (-216.4817, 46.3588) -> (-216.485, 46.775)
  arc A44 (-220.5983, 46.8412) -> (-221.945, 46.775) centre (-221.27, 46.775) ccw
  line L30 (-220.5983, 46.8412) -> (-220.595, 46.425)
  arc A45 (-221.9417, 46.3588) -> (-220.595, 46.425) centre (-221.27, 46.425) ccw
  line L31 (-221.9417, 46.3588) -> (-221.945, 46.775)
  circle A46 centre (-164.22, 127.34) radius 0.9005
  dimension "d44" = 1.801
extrude "Extrude17" cut sketch "Sketch13" against normal blind 15 contours A46
sketch "Sketch14" plane through (0, -37, 0) normal (0, 1, 0) x (-1, 0, 0)
  line L0 (-156.8147, -11.05) -> (-156.8147, -0.05)
  line L1 (-156.8147, -0.05) -> (-180.0368, -0.05)
  line L2 (-180.0368, -0.05) -> (-180.0368, -2.5147)
  line L3 (-180.0368, -2.5147) -> (-196.2868, -2.5147)
  line L4 (-196.2868, -2.5147) -> (-196.2868, -0.05)
  line L5 (-196.2868, -0.05) -> (-213.3861, -0.05)
  line L6 (-213.3861, -0.05) -> (-213.3861, -4.6383)
  line L7 (-213.3861, -4.6383) -> (-223.6278, -4.6383)
  line L8 (-223.6278, -4.6383) -> (-223.6278, -0.05)
  line L9 (-223.6278, -0.05) -> (-256.5, -0.05)
  line L10 (-256.5, -0.05) -> (-256.5, -11.05)
  line L11 (-256.5, -11.05) -> (-156.8147, -11.05)
  line L12 (-223.6278, -4.6383) -> (-225.3189, -4.6383)
  line L13 (-225.3189, -4.6383) -> (-225.3189, -0.05)
  line L14 (-225.3189, -0.05) -> (-223.6278, -0.05)
  line L15 (-223.6278, -0.05) -> (-223.6278, -4.6383)
extrude "Extrude18" cut sketch "Sketch14" against normal blind 9.5 contours L8 L9 L12 L13 L14 L15
sketch "Sketch15" plane through (0, -37, 0) normal (0, 1, 0) x (-1, 0, 0)
  line L0 (-213.3861, -4.6383) -> (-225.3189, -4.6383)
  line L1 (-225.3189, -4.6383) -> (-225.3189, -0.05)
  line L2 (-225.3189, -0.05) -> (-256.5, -0.05)
  line L3 (-256.5, -0.05) -> (-256.5, -11.05)
  line L4 (-256.5, -11.05) -> (-156.8147, -11.05)
  line L5 (-156.8147, -11.05) -> (-156.8147, -0.05)
  line L6 (-156.8147, -0.05) -> (-180.0368, -0.05)
  line L7 (-180.0368, -0.05) -> (-180.0368, -2.5147)
  line L8 (-180.0368, -2.5147) -> (-196.2868, -2.5147)
  line L9 (-196.2868, -2.5147) -> (-196.2868, -0.05)
  line L10 (-196.2868, -0.05) -> (-213.3861, -0.05)
  line L11 (-213.3861, -0.05) -> (-213.3861, -4.6383)
  line L12 (-213.3861, -4.6383) -> (-211.6951, -4.6383)
  line L13 (-211.6951, -4.6383) -> (-211.6951, -0.05)
  line L14 (-211.6951, -0.05) -> (-213.3861, -0.05)
  line L15 (-213.3861, -0.05) -> (-213.3861, -4.6383)
extrude "Extrude19" cut sketch "Sketch15" against normal blind 9 contours L10 L11 L12 L13 L14 L15
